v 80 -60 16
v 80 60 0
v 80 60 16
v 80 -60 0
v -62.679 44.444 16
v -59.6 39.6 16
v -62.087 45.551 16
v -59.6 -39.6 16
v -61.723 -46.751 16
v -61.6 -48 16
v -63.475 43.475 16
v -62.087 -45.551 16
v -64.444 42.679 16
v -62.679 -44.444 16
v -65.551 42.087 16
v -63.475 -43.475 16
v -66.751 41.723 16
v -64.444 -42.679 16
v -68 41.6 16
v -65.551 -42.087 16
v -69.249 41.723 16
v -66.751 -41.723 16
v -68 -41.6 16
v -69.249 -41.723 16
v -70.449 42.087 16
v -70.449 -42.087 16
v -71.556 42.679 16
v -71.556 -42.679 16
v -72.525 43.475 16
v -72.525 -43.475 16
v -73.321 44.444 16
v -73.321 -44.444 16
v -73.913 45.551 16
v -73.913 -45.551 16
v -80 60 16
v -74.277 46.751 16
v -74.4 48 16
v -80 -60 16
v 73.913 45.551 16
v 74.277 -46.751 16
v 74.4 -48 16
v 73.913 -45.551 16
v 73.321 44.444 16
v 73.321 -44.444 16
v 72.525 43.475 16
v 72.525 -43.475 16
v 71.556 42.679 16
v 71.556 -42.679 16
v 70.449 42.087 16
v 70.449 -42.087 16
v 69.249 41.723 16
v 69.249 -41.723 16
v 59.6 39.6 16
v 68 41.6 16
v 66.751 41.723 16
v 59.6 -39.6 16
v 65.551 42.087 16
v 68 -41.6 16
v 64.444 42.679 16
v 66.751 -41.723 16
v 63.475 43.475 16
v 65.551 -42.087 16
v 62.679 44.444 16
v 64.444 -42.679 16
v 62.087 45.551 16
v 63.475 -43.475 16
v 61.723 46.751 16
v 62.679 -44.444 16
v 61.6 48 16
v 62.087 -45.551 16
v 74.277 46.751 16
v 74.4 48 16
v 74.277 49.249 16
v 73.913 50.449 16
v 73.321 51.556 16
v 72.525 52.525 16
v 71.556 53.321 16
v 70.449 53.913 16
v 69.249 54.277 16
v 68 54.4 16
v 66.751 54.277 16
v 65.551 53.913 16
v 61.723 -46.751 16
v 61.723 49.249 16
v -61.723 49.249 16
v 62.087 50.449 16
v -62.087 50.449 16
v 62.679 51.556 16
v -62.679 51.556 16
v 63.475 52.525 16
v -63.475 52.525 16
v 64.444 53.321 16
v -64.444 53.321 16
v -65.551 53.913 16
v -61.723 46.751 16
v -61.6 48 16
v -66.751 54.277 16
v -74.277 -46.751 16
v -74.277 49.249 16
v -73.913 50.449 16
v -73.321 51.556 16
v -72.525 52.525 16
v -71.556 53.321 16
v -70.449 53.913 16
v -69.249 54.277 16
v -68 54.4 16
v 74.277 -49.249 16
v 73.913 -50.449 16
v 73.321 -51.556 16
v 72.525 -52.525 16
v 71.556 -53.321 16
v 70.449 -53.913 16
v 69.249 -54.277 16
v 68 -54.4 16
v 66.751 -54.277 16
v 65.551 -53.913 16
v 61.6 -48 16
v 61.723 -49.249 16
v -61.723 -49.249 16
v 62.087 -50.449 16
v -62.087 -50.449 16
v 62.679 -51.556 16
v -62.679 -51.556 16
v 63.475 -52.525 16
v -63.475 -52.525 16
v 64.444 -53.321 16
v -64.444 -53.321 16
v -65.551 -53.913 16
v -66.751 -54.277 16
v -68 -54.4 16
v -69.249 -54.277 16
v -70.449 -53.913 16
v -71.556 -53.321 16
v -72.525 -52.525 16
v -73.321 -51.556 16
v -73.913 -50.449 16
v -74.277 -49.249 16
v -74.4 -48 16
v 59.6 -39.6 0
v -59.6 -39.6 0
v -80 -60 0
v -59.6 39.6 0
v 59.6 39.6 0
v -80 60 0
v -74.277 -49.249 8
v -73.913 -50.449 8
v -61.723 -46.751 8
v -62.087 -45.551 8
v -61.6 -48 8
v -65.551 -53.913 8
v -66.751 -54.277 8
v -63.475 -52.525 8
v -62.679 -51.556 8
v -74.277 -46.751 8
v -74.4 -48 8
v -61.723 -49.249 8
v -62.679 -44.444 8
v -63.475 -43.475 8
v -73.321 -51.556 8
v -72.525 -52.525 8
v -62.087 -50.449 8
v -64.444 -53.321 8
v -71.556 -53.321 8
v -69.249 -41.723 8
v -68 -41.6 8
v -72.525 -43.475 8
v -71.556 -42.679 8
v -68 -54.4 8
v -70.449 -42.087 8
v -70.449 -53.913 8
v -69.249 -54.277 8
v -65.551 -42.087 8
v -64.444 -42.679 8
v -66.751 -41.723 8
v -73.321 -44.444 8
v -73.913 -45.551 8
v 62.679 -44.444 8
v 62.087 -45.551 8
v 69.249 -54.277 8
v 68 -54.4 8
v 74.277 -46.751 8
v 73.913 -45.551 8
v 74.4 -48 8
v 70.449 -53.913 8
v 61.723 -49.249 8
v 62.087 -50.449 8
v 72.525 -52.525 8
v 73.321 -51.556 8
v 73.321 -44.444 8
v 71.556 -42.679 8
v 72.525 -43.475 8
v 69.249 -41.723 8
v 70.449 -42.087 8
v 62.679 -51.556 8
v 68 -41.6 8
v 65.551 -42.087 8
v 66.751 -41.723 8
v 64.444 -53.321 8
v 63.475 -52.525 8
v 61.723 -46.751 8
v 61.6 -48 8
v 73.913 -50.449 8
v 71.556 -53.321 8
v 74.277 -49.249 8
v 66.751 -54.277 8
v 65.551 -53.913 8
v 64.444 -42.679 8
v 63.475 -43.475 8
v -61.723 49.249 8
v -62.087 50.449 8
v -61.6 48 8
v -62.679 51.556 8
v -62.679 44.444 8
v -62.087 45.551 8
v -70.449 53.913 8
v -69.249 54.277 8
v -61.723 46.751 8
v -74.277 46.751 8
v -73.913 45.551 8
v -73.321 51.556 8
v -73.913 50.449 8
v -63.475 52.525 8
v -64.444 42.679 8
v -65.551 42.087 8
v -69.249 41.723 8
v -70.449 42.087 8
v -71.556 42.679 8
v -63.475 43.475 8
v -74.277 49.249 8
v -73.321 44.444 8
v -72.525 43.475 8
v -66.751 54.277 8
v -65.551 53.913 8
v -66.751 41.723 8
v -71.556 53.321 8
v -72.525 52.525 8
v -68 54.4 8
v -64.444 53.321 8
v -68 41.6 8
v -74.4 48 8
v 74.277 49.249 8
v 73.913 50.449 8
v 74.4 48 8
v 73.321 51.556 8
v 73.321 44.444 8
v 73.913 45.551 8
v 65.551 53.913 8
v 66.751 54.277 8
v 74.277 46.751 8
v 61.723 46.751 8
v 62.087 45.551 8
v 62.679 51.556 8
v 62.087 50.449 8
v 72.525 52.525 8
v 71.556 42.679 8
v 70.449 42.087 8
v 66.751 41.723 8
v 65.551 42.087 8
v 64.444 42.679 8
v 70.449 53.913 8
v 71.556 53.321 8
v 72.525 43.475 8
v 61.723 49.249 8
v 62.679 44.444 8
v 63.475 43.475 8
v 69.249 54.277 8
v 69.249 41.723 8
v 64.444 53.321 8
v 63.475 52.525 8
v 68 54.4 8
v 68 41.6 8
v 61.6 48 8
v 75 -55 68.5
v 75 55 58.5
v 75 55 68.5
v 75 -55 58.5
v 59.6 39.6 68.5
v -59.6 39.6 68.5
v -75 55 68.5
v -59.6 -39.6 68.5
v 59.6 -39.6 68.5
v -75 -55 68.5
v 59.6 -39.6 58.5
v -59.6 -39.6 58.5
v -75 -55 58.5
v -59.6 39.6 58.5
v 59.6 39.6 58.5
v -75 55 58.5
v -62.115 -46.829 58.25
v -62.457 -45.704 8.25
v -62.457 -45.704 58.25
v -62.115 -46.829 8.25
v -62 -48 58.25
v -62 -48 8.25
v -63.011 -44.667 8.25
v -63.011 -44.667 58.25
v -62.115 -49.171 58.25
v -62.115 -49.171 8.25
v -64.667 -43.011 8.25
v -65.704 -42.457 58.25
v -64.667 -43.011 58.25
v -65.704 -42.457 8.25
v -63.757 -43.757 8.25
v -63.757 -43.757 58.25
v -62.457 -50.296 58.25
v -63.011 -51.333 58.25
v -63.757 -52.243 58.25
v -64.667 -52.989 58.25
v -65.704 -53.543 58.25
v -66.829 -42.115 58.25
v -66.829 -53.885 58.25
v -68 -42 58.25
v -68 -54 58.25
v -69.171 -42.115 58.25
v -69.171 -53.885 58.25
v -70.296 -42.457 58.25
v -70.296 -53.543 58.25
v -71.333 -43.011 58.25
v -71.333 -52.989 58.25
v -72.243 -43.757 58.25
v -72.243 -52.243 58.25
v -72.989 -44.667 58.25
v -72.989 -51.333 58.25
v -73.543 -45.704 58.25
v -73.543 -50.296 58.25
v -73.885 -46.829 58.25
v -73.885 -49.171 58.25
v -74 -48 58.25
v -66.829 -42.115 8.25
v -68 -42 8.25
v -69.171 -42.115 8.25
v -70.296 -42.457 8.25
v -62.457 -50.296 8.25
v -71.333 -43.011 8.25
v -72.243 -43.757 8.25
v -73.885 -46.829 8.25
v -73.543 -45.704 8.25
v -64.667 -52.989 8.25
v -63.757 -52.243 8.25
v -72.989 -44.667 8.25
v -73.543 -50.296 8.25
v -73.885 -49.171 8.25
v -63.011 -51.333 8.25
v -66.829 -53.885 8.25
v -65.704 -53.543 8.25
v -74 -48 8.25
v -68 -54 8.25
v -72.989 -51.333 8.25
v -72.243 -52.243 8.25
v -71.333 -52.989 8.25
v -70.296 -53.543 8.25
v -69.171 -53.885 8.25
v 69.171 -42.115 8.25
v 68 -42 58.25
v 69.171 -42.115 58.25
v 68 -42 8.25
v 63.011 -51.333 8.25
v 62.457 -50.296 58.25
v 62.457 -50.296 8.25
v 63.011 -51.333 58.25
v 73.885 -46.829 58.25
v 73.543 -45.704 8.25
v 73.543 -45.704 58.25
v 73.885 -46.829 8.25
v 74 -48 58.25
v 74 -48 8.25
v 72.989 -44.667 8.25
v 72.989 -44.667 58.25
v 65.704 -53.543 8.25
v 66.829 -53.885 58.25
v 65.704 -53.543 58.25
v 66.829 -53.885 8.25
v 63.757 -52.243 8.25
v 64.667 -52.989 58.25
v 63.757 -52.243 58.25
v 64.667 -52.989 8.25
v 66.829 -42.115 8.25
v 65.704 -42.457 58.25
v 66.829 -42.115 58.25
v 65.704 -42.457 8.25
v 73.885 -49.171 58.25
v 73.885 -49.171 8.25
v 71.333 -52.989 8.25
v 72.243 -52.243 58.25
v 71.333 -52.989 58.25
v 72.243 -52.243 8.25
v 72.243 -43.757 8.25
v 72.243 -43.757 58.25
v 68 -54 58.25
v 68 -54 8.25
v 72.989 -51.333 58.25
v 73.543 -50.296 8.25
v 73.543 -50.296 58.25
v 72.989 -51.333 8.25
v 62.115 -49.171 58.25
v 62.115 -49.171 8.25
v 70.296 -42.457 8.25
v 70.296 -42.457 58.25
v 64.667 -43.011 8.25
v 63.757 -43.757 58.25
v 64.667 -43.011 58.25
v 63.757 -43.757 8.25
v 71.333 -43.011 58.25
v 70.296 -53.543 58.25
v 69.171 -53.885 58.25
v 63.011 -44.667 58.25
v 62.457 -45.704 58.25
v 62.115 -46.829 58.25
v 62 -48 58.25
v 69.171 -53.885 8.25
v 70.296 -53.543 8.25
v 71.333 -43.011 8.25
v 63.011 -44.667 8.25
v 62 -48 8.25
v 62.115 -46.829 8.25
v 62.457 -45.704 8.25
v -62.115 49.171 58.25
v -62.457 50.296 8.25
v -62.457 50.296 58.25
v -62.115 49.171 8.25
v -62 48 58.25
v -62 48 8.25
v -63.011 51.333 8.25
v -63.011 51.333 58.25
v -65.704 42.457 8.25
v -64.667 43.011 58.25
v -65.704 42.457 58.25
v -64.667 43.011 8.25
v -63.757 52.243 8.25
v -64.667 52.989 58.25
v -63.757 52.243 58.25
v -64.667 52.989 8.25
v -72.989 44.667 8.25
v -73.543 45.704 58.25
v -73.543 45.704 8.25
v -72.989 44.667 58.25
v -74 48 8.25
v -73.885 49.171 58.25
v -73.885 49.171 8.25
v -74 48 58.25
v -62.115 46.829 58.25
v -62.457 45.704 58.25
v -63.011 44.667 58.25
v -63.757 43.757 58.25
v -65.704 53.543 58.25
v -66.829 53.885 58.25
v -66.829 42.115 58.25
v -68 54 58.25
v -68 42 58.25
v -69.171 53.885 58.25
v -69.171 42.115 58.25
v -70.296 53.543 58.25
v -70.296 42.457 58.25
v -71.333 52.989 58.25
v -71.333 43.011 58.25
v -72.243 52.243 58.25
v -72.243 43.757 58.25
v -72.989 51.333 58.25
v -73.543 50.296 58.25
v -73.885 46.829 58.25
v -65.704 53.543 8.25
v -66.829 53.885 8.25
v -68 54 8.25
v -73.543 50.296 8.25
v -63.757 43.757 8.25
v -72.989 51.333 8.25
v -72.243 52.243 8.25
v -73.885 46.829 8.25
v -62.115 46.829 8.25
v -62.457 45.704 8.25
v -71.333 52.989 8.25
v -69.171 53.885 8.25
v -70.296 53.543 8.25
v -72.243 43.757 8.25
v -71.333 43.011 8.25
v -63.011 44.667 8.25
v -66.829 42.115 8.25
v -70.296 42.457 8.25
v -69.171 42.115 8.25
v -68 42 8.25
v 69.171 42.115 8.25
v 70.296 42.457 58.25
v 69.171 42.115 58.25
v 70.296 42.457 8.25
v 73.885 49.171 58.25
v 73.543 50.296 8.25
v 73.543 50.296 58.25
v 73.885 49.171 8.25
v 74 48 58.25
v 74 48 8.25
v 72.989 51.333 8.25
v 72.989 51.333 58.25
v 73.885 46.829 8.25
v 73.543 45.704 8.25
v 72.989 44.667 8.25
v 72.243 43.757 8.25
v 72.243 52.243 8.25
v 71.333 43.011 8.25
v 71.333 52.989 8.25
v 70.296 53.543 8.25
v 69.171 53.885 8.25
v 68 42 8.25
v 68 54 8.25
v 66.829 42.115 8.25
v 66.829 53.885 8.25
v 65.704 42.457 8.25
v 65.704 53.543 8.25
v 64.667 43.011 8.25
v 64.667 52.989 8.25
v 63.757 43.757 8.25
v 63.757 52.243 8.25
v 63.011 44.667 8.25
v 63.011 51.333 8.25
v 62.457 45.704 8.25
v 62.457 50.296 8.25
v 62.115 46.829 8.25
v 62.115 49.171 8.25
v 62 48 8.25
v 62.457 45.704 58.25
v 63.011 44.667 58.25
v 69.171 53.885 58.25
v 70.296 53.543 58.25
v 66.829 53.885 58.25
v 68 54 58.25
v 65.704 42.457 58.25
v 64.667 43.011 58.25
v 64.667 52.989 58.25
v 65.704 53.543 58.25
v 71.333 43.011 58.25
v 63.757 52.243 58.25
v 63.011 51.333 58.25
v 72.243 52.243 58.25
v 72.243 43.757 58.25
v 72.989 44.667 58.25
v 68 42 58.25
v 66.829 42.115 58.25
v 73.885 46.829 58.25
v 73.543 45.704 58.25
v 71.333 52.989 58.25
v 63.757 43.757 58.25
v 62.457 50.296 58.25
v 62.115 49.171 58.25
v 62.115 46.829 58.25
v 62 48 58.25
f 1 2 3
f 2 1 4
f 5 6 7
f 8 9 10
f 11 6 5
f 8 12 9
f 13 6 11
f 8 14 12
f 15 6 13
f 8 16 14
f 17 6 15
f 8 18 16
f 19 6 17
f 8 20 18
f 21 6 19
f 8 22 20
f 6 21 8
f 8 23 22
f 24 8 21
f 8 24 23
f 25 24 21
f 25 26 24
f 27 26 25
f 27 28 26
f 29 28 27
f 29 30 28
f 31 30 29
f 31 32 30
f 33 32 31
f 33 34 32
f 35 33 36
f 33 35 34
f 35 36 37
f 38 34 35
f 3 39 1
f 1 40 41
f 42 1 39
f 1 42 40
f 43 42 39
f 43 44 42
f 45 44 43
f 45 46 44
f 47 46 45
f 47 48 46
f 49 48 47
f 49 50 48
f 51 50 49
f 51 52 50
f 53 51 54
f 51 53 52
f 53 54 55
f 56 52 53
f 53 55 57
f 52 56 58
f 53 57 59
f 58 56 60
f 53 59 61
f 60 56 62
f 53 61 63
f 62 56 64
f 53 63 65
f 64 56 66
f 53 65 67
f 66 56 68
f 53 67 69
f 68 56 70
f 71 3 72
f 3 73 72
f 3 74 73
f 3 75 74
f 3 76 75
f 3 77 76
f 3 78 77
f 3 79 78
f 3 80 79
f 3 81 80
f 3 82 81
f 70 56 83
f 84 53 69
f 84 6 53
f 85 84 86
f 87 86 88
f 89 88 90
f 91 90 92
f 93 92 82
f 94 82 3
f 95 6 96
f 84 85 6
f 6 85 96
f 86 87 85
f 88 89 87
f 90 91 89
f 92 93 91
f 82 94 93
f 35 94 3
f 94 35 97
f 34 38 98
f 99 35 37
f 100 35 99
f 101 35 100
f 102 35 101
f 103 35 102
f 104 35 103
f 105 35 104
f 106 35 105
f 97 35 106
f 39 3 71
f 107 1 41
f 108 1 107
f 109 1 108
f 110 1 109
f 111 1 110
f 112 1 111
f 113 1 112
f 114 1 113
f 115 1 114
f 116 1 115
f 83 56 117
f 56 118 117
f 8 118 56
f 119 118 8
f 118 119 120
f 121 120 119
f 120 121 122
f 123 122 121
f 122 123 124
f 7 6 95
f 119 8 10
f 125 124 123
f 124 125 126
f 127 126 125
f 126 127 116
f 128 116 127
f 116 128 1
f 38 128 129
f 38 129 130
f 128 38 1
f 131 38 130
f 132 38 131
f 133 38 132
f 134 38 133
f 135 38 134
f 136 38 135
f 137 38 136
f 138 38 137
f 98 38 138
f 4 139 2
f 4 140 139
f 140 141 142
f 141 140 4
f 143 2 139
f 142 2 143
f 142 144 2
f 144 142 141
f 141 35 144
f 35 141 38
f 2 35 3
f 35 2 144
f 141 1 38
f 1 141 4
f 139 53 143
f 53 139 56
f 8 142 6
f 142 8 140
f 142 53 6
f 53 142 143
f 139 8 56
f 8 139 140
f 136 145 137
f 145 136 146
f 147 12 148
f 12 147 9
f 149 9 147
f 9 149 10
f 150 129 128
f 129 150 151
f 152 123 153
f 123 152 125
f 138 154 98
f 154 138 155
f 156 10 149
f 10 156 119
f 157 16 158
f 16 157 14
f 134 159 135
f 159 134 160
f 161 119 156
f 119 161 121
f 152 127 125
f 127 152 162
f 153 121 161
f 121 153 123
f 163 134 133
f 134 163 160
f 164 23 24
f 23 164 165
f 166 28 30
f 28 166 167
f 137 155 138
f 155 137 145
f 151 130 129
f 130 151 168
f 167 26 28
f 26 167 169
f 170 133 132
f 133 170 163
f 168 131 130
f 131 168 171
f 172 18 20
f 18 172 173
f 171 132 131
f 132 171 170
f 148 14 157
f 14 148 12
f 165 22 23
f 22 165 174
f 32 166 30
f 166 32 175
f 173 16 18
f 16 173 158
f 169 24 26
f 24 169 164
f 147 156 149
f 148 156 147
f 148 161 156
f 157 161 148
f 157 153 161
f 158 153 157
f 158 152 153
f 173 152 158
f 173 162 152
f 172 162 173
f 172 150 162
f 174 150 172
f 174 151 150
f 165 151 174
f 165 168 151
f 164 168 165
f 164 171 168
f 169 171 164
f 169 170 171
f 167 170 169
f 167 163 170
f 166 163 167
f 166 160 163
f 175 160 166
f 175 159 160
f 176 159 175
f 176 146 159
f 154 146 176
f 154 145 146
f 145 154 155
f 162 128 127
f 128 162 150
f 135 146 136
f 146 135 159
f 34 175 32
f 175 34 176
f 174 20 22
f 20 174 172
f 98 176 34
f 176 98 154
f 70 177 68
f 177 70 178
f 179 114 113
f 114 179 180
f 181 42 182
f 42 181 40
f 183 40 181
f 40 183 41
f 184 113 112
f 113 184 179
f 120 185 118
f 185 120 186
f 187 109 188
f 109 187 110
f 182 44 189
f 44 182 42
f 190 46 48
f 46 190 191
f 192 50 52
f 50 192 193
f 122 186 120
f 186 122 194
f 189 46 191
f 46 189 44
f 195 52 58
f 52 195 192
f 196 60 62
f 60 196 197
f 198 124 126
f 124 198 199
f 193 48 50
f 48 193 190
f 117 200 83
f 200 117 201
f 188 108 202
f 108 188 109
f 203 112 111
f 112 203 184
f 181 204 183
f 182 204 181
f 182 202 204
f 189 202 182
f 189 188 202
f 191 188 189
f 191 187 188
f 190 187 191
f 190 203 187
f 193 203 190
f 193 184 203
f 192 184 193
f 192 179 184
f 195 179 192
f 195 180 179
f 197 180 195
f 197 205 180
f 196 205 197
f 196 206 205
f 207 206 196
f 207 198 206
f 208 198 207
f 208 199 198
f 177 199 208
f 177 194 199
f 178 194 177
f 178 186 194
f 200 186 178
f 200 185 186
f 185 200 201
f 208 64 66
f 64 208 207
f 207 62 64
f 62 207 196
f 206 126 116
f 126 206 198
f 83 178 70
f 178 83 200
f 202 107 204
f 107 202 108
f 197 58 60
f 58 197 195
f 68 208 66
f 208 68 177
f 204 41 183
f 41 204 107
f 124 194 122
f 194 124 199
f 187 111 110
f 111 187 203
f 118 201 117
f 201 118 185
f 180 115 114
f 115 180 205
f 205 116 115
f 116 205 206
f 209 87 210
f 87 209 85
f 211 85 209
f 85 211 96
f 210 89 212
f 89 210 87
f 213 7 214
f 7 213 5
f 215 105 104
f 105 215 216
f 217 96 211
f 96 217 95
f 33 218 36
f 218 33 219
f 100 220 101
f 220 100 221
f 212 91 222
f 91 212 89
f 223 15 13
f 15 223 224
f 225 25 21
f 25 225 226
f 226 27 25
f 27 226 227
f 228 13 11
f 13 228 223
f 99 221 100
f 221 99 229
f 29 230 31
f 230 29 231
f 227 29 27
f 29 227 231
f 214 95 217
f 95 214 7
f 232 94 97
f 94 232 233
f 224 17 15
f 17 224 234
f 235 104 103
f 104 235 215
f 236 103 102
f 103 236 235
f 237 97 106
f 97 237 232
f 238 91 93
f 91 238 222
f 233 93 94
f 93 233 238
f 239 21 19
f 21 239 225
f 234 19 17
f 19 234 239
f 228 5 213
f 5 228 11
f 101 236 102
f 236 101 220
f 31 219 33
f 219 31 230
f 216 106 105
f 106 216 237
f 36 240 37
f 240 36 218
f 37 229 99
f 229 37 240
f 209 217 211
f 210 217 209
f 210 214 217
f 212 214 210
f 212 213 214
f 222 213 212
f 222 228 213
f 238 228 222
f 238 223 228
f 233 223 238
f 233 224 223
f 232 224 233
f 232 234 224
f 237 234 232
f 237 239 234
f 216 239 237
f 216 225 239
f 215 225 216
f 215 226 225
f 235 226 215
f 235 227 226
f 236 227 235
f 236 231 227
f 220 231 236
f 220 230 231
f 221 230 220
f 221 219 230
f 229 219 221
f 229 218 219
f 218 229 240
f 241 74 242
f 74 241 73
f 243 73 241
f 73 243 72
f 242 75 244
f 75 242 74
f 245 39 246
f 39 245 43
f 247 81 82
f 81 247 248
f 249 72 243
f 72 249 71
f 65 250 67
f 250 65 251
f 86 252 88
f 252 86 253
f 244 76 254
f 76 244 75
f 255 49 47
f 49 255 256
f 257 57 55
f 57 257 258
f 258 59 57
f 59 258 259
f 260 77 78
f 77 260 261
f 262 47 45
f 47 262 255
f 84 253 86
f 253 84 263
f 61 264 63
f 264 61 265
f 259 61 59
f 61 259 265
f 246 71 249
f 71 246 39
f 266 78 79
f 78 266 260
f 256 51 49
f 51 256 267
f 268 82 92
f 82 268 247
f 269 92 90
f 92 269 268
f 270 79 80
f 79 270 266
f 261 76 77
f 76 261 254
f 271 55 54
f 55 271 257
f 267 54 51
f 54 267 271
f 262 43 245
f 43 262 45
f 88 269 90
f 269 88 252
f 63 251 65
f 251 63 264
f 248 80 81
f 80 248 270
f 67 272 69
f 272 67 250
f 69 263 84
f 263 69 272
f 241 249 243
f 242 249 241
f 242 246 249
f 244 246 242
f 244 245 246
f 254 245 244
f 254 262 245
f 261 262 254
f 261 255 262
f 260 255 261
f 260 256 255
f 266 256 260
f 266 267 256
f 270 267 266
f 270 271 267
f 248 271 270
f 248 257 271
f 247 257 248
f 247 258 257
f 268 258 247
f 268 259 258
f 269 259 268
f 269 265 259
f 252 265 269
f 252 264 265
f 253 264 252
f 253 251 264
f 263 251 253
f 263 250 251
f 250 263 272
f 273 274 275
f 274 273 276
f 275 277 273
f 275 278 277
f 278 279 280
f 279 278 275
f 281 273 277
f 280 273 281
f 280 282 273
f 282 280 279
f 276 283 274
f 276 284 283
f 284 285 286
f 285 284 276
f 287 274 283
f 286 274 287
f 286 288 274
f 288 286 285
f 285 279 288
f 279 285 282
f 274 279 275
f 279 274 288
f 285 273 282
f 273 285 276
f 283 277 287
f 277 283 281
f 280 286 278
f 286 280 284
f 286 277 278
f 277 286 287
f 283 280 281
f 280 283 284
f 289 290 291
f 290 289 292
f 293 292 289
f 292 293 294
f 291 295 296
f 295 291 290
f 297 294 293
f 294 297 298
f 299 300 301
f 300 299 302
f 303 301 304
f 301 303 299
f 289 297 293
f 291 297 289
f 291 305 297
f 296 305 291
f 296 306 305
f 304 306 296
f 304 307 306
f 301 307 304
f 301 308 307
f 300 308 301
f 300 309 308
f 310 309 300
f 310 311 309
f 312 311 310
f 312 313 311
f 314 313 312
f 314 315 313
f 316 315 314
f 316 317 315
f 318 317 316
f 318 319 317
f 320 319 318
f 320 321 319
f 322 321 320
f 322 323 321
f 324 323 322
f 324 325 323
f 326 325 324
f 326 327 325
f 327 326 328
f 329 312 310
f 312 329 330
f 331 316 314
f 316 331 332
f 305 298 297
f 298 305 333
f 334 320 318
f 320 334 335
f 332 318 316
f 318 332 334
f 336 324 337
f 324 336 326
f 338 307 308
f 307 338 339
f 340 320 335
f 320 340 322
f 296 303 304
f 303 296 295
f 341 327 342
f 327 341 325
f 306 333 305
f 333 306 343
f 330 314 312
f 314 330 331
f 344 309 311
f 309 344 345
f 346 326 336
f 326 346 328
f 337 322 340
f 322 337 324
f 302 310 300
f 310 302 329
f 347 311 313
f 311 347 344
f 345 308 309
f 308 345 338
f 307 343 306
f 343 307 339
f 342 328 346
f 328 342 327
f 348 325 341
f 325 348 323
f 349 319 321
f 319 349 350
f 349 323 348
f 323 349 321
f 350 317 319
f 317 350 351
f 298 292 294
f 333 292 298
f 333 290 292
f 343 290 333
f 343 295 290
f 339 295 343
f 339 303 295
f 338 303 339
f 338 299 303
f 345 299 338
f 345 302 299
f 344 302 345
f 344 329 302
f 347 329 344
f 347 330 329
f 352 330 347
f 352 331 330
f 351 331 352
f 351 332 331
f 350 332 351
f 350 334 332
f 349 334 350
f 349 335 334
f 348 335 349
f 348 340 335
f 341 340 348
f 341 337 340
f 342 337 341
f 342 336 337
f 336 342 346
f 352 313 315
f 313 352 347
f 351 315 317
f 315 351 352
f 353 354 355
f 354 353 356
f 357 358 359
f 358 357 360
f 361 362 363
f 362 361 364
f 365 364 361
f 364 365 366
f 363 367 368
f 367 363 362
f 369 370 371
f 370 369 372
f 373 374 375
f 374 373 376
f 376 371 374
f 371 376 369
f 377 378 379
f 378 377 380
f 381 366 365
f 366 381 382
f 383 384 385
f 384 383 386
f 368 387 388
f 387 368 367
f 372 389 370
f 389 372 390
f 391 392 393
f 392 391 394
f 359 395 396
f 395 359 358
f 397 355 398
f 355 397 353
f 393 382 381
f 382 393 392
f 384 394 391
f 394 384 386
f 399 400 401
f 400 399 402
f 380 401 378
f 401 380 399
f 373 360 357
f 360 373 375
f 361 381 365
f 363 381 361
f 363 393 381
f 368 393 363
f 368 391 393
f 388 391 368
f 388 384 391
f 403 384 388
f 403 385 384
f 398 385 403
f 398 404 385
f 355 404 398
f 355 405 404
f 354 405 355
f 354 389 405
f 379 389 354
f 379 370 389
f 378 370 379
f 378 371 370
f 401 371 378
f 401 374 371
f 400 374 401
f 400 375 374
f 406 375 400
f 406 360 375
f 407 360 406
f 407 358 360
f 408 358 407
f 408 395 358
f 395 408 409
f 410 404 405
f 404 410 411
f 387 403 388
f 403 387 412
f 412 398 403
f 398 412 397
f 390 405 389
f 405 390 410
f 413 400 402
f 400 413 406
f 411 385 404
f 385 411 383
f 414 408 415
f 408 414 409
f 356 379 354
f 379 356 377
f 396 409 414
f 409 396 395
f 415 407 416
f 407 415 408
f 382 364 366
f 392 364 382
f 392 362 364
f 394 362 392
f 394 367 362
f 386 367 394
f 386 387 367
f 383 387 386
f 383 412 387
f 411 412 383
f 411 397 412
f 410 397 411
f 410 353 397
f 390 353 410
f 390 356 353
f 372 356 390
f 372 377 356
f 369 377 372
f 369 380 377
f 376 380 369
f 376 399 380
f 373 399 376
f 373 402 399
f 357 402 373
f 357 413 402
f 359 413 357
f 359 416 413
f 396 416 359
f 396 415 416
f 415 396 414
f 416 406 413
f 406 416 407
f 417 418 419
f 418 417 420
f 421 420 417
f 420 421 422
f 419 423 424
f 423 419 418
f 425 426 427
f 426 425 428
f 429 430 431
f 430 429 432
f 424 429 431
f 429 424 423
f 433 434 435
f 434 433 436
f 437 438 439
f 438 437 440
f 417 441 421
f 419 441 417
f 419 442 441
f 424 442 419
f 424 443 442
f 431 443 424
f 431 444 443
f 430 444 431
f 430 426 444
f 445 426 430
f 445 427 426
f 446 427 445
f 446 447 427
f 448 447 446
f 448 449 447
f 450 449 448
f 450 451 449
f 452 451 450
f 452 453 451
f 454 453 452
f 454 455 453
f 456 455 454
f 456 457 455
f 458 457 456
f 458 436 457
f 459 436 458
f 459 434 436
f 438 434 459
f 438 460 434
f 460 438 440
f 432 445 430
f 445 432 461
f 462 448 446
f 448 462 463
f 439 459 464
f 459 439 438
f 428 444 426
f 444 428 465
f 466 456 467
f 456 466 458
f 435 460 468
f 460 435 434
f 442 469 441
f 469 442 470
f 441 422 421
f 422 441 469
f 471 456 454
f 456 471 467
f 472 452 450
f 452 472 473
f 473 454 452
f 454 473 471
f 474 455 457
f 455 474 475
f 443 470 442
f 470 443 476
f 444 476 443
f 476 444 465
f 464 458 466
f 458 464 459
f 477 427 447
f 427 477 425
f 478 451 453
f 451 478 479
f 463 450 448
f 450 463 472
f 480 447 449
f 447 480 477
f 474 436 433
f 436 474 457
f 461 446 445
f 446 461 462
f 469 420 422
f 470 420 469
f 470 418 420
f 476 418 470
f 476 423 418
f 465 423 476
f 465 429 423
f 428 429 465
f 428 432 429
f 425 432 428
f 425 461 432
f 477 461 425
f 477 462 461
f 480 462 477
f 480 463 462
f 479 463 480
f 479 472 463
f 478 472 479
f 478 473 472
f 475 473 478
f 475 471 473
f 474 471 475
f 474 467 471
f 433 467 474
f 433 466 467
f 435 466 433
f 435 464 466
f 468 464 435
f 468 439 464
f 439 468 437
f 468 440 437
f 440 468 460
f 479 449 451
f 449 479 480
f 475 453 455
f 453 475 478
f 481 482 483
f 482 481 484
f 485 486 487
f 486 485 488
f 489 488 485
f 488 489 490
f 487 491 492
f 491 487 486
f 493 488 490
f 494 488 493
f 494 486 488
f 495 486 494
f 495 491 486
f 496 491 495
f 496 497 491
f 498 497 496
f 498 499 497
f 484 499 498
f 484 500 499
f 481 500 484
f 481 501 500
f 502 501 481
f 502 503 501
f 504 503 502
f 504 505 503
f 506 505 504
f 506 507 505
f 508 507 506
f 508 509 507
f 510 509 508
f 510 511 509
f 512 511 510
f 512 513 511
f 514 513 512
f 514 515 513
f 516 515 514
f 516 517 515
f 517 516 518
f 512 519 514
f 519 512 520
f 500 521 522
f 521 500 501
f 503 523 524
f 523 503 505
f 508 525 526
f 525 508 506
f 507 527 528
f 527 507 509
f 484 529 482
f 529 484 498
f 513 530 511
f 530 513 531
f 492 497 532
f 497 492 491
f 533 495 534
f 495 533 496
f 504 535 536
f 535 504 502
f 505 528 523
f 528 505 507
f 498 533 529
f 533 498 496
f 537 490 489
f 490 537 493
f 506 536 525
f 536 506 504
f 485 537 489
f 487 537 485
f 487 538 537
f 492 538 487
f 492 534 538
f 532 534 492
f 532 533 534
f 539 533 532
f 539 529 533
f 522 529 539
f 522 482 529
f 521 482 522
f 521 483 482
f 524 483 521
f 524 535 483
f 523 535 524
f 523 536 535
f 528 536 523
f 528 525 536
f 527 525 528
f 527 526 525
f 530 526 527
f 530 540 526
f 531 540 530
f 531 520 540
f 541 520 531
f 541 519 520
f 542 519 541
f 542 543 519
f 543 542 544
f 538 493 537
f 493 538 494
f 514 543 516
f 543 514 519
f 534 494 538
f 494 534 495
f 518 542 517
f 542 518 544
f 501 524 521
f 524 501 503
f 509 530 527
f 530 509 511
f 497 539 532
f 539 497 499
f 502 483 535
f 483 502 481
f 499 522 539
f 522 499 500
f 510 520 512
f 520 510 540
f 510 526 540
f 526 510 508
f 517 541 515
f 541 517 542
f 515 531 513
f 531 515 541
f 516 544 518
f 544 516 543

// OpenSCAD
$fn = 32;

// ------------------------------------------------------------------------
// Frame cube: base 160 x 120 mm, posts 50 mm tall
// Every part is its own module, assembly() places every instance.
// ------------------------------------------------------------------------

// --- part 1 ---
module base_frame() {
  difference() {
    translate([-80, -60, 0]) cube([160, 120, 16]);
    translate([-59.6, -39.6, -1]) cube([119.2, 79.2, 18]);
    translate([-68, -48, 8]) cylinder(h = 9, d = 12.8);
    translate([68, -48, 8]) cylinder(h = 9, d = 12.8);
    translate([-68, 48, 8]) cylinder(h = 9, d = 12.8);
    translate([68, 48, 8]) cylinder(h = 9, d = 12.8);
  }
}

// --- part 2 ---
module corner_post() {
  cylinder(h = 50, d = 12);
}

// --- part 3 ---
module top_frame() {
  difference() {
    translate([-75, -55, 0]) cube([150, 110, 10]);
    translate([-59.6, -39.6, -1]) cube([119.2, 79.2, 12]);
  }
}

// --- assembly ---
module assembly() {
  color([0.80, 0.24, 0.20]) translate([0, 0, 0]) rotate([0, 0, 0]) base_frame();
  color([0.20, 0.45, 0.75]) translate([-68, -48, 8.25]) rotate([0, 0, 0]) corner_post();
  color([0.25, 0.62, 0.32]) translate([68, -48, 8.25]) rotate([0, 0, 0]) corner_post();
  color([0.92, 0.70, 0.18]) translate([-68, 48, 8.25]) rotate([0, 0, 0]) corner_post();
  color([0.58, 0.35, 0.70]) translate([68, 48, 8.25]) rotate([0, 0, 0]) corner_post();
  color([0.16, 0.66, 0.66]) translate([0, 0, 58.5]) rotate([0, 0, 0]) top_frame();
}

assembly();
